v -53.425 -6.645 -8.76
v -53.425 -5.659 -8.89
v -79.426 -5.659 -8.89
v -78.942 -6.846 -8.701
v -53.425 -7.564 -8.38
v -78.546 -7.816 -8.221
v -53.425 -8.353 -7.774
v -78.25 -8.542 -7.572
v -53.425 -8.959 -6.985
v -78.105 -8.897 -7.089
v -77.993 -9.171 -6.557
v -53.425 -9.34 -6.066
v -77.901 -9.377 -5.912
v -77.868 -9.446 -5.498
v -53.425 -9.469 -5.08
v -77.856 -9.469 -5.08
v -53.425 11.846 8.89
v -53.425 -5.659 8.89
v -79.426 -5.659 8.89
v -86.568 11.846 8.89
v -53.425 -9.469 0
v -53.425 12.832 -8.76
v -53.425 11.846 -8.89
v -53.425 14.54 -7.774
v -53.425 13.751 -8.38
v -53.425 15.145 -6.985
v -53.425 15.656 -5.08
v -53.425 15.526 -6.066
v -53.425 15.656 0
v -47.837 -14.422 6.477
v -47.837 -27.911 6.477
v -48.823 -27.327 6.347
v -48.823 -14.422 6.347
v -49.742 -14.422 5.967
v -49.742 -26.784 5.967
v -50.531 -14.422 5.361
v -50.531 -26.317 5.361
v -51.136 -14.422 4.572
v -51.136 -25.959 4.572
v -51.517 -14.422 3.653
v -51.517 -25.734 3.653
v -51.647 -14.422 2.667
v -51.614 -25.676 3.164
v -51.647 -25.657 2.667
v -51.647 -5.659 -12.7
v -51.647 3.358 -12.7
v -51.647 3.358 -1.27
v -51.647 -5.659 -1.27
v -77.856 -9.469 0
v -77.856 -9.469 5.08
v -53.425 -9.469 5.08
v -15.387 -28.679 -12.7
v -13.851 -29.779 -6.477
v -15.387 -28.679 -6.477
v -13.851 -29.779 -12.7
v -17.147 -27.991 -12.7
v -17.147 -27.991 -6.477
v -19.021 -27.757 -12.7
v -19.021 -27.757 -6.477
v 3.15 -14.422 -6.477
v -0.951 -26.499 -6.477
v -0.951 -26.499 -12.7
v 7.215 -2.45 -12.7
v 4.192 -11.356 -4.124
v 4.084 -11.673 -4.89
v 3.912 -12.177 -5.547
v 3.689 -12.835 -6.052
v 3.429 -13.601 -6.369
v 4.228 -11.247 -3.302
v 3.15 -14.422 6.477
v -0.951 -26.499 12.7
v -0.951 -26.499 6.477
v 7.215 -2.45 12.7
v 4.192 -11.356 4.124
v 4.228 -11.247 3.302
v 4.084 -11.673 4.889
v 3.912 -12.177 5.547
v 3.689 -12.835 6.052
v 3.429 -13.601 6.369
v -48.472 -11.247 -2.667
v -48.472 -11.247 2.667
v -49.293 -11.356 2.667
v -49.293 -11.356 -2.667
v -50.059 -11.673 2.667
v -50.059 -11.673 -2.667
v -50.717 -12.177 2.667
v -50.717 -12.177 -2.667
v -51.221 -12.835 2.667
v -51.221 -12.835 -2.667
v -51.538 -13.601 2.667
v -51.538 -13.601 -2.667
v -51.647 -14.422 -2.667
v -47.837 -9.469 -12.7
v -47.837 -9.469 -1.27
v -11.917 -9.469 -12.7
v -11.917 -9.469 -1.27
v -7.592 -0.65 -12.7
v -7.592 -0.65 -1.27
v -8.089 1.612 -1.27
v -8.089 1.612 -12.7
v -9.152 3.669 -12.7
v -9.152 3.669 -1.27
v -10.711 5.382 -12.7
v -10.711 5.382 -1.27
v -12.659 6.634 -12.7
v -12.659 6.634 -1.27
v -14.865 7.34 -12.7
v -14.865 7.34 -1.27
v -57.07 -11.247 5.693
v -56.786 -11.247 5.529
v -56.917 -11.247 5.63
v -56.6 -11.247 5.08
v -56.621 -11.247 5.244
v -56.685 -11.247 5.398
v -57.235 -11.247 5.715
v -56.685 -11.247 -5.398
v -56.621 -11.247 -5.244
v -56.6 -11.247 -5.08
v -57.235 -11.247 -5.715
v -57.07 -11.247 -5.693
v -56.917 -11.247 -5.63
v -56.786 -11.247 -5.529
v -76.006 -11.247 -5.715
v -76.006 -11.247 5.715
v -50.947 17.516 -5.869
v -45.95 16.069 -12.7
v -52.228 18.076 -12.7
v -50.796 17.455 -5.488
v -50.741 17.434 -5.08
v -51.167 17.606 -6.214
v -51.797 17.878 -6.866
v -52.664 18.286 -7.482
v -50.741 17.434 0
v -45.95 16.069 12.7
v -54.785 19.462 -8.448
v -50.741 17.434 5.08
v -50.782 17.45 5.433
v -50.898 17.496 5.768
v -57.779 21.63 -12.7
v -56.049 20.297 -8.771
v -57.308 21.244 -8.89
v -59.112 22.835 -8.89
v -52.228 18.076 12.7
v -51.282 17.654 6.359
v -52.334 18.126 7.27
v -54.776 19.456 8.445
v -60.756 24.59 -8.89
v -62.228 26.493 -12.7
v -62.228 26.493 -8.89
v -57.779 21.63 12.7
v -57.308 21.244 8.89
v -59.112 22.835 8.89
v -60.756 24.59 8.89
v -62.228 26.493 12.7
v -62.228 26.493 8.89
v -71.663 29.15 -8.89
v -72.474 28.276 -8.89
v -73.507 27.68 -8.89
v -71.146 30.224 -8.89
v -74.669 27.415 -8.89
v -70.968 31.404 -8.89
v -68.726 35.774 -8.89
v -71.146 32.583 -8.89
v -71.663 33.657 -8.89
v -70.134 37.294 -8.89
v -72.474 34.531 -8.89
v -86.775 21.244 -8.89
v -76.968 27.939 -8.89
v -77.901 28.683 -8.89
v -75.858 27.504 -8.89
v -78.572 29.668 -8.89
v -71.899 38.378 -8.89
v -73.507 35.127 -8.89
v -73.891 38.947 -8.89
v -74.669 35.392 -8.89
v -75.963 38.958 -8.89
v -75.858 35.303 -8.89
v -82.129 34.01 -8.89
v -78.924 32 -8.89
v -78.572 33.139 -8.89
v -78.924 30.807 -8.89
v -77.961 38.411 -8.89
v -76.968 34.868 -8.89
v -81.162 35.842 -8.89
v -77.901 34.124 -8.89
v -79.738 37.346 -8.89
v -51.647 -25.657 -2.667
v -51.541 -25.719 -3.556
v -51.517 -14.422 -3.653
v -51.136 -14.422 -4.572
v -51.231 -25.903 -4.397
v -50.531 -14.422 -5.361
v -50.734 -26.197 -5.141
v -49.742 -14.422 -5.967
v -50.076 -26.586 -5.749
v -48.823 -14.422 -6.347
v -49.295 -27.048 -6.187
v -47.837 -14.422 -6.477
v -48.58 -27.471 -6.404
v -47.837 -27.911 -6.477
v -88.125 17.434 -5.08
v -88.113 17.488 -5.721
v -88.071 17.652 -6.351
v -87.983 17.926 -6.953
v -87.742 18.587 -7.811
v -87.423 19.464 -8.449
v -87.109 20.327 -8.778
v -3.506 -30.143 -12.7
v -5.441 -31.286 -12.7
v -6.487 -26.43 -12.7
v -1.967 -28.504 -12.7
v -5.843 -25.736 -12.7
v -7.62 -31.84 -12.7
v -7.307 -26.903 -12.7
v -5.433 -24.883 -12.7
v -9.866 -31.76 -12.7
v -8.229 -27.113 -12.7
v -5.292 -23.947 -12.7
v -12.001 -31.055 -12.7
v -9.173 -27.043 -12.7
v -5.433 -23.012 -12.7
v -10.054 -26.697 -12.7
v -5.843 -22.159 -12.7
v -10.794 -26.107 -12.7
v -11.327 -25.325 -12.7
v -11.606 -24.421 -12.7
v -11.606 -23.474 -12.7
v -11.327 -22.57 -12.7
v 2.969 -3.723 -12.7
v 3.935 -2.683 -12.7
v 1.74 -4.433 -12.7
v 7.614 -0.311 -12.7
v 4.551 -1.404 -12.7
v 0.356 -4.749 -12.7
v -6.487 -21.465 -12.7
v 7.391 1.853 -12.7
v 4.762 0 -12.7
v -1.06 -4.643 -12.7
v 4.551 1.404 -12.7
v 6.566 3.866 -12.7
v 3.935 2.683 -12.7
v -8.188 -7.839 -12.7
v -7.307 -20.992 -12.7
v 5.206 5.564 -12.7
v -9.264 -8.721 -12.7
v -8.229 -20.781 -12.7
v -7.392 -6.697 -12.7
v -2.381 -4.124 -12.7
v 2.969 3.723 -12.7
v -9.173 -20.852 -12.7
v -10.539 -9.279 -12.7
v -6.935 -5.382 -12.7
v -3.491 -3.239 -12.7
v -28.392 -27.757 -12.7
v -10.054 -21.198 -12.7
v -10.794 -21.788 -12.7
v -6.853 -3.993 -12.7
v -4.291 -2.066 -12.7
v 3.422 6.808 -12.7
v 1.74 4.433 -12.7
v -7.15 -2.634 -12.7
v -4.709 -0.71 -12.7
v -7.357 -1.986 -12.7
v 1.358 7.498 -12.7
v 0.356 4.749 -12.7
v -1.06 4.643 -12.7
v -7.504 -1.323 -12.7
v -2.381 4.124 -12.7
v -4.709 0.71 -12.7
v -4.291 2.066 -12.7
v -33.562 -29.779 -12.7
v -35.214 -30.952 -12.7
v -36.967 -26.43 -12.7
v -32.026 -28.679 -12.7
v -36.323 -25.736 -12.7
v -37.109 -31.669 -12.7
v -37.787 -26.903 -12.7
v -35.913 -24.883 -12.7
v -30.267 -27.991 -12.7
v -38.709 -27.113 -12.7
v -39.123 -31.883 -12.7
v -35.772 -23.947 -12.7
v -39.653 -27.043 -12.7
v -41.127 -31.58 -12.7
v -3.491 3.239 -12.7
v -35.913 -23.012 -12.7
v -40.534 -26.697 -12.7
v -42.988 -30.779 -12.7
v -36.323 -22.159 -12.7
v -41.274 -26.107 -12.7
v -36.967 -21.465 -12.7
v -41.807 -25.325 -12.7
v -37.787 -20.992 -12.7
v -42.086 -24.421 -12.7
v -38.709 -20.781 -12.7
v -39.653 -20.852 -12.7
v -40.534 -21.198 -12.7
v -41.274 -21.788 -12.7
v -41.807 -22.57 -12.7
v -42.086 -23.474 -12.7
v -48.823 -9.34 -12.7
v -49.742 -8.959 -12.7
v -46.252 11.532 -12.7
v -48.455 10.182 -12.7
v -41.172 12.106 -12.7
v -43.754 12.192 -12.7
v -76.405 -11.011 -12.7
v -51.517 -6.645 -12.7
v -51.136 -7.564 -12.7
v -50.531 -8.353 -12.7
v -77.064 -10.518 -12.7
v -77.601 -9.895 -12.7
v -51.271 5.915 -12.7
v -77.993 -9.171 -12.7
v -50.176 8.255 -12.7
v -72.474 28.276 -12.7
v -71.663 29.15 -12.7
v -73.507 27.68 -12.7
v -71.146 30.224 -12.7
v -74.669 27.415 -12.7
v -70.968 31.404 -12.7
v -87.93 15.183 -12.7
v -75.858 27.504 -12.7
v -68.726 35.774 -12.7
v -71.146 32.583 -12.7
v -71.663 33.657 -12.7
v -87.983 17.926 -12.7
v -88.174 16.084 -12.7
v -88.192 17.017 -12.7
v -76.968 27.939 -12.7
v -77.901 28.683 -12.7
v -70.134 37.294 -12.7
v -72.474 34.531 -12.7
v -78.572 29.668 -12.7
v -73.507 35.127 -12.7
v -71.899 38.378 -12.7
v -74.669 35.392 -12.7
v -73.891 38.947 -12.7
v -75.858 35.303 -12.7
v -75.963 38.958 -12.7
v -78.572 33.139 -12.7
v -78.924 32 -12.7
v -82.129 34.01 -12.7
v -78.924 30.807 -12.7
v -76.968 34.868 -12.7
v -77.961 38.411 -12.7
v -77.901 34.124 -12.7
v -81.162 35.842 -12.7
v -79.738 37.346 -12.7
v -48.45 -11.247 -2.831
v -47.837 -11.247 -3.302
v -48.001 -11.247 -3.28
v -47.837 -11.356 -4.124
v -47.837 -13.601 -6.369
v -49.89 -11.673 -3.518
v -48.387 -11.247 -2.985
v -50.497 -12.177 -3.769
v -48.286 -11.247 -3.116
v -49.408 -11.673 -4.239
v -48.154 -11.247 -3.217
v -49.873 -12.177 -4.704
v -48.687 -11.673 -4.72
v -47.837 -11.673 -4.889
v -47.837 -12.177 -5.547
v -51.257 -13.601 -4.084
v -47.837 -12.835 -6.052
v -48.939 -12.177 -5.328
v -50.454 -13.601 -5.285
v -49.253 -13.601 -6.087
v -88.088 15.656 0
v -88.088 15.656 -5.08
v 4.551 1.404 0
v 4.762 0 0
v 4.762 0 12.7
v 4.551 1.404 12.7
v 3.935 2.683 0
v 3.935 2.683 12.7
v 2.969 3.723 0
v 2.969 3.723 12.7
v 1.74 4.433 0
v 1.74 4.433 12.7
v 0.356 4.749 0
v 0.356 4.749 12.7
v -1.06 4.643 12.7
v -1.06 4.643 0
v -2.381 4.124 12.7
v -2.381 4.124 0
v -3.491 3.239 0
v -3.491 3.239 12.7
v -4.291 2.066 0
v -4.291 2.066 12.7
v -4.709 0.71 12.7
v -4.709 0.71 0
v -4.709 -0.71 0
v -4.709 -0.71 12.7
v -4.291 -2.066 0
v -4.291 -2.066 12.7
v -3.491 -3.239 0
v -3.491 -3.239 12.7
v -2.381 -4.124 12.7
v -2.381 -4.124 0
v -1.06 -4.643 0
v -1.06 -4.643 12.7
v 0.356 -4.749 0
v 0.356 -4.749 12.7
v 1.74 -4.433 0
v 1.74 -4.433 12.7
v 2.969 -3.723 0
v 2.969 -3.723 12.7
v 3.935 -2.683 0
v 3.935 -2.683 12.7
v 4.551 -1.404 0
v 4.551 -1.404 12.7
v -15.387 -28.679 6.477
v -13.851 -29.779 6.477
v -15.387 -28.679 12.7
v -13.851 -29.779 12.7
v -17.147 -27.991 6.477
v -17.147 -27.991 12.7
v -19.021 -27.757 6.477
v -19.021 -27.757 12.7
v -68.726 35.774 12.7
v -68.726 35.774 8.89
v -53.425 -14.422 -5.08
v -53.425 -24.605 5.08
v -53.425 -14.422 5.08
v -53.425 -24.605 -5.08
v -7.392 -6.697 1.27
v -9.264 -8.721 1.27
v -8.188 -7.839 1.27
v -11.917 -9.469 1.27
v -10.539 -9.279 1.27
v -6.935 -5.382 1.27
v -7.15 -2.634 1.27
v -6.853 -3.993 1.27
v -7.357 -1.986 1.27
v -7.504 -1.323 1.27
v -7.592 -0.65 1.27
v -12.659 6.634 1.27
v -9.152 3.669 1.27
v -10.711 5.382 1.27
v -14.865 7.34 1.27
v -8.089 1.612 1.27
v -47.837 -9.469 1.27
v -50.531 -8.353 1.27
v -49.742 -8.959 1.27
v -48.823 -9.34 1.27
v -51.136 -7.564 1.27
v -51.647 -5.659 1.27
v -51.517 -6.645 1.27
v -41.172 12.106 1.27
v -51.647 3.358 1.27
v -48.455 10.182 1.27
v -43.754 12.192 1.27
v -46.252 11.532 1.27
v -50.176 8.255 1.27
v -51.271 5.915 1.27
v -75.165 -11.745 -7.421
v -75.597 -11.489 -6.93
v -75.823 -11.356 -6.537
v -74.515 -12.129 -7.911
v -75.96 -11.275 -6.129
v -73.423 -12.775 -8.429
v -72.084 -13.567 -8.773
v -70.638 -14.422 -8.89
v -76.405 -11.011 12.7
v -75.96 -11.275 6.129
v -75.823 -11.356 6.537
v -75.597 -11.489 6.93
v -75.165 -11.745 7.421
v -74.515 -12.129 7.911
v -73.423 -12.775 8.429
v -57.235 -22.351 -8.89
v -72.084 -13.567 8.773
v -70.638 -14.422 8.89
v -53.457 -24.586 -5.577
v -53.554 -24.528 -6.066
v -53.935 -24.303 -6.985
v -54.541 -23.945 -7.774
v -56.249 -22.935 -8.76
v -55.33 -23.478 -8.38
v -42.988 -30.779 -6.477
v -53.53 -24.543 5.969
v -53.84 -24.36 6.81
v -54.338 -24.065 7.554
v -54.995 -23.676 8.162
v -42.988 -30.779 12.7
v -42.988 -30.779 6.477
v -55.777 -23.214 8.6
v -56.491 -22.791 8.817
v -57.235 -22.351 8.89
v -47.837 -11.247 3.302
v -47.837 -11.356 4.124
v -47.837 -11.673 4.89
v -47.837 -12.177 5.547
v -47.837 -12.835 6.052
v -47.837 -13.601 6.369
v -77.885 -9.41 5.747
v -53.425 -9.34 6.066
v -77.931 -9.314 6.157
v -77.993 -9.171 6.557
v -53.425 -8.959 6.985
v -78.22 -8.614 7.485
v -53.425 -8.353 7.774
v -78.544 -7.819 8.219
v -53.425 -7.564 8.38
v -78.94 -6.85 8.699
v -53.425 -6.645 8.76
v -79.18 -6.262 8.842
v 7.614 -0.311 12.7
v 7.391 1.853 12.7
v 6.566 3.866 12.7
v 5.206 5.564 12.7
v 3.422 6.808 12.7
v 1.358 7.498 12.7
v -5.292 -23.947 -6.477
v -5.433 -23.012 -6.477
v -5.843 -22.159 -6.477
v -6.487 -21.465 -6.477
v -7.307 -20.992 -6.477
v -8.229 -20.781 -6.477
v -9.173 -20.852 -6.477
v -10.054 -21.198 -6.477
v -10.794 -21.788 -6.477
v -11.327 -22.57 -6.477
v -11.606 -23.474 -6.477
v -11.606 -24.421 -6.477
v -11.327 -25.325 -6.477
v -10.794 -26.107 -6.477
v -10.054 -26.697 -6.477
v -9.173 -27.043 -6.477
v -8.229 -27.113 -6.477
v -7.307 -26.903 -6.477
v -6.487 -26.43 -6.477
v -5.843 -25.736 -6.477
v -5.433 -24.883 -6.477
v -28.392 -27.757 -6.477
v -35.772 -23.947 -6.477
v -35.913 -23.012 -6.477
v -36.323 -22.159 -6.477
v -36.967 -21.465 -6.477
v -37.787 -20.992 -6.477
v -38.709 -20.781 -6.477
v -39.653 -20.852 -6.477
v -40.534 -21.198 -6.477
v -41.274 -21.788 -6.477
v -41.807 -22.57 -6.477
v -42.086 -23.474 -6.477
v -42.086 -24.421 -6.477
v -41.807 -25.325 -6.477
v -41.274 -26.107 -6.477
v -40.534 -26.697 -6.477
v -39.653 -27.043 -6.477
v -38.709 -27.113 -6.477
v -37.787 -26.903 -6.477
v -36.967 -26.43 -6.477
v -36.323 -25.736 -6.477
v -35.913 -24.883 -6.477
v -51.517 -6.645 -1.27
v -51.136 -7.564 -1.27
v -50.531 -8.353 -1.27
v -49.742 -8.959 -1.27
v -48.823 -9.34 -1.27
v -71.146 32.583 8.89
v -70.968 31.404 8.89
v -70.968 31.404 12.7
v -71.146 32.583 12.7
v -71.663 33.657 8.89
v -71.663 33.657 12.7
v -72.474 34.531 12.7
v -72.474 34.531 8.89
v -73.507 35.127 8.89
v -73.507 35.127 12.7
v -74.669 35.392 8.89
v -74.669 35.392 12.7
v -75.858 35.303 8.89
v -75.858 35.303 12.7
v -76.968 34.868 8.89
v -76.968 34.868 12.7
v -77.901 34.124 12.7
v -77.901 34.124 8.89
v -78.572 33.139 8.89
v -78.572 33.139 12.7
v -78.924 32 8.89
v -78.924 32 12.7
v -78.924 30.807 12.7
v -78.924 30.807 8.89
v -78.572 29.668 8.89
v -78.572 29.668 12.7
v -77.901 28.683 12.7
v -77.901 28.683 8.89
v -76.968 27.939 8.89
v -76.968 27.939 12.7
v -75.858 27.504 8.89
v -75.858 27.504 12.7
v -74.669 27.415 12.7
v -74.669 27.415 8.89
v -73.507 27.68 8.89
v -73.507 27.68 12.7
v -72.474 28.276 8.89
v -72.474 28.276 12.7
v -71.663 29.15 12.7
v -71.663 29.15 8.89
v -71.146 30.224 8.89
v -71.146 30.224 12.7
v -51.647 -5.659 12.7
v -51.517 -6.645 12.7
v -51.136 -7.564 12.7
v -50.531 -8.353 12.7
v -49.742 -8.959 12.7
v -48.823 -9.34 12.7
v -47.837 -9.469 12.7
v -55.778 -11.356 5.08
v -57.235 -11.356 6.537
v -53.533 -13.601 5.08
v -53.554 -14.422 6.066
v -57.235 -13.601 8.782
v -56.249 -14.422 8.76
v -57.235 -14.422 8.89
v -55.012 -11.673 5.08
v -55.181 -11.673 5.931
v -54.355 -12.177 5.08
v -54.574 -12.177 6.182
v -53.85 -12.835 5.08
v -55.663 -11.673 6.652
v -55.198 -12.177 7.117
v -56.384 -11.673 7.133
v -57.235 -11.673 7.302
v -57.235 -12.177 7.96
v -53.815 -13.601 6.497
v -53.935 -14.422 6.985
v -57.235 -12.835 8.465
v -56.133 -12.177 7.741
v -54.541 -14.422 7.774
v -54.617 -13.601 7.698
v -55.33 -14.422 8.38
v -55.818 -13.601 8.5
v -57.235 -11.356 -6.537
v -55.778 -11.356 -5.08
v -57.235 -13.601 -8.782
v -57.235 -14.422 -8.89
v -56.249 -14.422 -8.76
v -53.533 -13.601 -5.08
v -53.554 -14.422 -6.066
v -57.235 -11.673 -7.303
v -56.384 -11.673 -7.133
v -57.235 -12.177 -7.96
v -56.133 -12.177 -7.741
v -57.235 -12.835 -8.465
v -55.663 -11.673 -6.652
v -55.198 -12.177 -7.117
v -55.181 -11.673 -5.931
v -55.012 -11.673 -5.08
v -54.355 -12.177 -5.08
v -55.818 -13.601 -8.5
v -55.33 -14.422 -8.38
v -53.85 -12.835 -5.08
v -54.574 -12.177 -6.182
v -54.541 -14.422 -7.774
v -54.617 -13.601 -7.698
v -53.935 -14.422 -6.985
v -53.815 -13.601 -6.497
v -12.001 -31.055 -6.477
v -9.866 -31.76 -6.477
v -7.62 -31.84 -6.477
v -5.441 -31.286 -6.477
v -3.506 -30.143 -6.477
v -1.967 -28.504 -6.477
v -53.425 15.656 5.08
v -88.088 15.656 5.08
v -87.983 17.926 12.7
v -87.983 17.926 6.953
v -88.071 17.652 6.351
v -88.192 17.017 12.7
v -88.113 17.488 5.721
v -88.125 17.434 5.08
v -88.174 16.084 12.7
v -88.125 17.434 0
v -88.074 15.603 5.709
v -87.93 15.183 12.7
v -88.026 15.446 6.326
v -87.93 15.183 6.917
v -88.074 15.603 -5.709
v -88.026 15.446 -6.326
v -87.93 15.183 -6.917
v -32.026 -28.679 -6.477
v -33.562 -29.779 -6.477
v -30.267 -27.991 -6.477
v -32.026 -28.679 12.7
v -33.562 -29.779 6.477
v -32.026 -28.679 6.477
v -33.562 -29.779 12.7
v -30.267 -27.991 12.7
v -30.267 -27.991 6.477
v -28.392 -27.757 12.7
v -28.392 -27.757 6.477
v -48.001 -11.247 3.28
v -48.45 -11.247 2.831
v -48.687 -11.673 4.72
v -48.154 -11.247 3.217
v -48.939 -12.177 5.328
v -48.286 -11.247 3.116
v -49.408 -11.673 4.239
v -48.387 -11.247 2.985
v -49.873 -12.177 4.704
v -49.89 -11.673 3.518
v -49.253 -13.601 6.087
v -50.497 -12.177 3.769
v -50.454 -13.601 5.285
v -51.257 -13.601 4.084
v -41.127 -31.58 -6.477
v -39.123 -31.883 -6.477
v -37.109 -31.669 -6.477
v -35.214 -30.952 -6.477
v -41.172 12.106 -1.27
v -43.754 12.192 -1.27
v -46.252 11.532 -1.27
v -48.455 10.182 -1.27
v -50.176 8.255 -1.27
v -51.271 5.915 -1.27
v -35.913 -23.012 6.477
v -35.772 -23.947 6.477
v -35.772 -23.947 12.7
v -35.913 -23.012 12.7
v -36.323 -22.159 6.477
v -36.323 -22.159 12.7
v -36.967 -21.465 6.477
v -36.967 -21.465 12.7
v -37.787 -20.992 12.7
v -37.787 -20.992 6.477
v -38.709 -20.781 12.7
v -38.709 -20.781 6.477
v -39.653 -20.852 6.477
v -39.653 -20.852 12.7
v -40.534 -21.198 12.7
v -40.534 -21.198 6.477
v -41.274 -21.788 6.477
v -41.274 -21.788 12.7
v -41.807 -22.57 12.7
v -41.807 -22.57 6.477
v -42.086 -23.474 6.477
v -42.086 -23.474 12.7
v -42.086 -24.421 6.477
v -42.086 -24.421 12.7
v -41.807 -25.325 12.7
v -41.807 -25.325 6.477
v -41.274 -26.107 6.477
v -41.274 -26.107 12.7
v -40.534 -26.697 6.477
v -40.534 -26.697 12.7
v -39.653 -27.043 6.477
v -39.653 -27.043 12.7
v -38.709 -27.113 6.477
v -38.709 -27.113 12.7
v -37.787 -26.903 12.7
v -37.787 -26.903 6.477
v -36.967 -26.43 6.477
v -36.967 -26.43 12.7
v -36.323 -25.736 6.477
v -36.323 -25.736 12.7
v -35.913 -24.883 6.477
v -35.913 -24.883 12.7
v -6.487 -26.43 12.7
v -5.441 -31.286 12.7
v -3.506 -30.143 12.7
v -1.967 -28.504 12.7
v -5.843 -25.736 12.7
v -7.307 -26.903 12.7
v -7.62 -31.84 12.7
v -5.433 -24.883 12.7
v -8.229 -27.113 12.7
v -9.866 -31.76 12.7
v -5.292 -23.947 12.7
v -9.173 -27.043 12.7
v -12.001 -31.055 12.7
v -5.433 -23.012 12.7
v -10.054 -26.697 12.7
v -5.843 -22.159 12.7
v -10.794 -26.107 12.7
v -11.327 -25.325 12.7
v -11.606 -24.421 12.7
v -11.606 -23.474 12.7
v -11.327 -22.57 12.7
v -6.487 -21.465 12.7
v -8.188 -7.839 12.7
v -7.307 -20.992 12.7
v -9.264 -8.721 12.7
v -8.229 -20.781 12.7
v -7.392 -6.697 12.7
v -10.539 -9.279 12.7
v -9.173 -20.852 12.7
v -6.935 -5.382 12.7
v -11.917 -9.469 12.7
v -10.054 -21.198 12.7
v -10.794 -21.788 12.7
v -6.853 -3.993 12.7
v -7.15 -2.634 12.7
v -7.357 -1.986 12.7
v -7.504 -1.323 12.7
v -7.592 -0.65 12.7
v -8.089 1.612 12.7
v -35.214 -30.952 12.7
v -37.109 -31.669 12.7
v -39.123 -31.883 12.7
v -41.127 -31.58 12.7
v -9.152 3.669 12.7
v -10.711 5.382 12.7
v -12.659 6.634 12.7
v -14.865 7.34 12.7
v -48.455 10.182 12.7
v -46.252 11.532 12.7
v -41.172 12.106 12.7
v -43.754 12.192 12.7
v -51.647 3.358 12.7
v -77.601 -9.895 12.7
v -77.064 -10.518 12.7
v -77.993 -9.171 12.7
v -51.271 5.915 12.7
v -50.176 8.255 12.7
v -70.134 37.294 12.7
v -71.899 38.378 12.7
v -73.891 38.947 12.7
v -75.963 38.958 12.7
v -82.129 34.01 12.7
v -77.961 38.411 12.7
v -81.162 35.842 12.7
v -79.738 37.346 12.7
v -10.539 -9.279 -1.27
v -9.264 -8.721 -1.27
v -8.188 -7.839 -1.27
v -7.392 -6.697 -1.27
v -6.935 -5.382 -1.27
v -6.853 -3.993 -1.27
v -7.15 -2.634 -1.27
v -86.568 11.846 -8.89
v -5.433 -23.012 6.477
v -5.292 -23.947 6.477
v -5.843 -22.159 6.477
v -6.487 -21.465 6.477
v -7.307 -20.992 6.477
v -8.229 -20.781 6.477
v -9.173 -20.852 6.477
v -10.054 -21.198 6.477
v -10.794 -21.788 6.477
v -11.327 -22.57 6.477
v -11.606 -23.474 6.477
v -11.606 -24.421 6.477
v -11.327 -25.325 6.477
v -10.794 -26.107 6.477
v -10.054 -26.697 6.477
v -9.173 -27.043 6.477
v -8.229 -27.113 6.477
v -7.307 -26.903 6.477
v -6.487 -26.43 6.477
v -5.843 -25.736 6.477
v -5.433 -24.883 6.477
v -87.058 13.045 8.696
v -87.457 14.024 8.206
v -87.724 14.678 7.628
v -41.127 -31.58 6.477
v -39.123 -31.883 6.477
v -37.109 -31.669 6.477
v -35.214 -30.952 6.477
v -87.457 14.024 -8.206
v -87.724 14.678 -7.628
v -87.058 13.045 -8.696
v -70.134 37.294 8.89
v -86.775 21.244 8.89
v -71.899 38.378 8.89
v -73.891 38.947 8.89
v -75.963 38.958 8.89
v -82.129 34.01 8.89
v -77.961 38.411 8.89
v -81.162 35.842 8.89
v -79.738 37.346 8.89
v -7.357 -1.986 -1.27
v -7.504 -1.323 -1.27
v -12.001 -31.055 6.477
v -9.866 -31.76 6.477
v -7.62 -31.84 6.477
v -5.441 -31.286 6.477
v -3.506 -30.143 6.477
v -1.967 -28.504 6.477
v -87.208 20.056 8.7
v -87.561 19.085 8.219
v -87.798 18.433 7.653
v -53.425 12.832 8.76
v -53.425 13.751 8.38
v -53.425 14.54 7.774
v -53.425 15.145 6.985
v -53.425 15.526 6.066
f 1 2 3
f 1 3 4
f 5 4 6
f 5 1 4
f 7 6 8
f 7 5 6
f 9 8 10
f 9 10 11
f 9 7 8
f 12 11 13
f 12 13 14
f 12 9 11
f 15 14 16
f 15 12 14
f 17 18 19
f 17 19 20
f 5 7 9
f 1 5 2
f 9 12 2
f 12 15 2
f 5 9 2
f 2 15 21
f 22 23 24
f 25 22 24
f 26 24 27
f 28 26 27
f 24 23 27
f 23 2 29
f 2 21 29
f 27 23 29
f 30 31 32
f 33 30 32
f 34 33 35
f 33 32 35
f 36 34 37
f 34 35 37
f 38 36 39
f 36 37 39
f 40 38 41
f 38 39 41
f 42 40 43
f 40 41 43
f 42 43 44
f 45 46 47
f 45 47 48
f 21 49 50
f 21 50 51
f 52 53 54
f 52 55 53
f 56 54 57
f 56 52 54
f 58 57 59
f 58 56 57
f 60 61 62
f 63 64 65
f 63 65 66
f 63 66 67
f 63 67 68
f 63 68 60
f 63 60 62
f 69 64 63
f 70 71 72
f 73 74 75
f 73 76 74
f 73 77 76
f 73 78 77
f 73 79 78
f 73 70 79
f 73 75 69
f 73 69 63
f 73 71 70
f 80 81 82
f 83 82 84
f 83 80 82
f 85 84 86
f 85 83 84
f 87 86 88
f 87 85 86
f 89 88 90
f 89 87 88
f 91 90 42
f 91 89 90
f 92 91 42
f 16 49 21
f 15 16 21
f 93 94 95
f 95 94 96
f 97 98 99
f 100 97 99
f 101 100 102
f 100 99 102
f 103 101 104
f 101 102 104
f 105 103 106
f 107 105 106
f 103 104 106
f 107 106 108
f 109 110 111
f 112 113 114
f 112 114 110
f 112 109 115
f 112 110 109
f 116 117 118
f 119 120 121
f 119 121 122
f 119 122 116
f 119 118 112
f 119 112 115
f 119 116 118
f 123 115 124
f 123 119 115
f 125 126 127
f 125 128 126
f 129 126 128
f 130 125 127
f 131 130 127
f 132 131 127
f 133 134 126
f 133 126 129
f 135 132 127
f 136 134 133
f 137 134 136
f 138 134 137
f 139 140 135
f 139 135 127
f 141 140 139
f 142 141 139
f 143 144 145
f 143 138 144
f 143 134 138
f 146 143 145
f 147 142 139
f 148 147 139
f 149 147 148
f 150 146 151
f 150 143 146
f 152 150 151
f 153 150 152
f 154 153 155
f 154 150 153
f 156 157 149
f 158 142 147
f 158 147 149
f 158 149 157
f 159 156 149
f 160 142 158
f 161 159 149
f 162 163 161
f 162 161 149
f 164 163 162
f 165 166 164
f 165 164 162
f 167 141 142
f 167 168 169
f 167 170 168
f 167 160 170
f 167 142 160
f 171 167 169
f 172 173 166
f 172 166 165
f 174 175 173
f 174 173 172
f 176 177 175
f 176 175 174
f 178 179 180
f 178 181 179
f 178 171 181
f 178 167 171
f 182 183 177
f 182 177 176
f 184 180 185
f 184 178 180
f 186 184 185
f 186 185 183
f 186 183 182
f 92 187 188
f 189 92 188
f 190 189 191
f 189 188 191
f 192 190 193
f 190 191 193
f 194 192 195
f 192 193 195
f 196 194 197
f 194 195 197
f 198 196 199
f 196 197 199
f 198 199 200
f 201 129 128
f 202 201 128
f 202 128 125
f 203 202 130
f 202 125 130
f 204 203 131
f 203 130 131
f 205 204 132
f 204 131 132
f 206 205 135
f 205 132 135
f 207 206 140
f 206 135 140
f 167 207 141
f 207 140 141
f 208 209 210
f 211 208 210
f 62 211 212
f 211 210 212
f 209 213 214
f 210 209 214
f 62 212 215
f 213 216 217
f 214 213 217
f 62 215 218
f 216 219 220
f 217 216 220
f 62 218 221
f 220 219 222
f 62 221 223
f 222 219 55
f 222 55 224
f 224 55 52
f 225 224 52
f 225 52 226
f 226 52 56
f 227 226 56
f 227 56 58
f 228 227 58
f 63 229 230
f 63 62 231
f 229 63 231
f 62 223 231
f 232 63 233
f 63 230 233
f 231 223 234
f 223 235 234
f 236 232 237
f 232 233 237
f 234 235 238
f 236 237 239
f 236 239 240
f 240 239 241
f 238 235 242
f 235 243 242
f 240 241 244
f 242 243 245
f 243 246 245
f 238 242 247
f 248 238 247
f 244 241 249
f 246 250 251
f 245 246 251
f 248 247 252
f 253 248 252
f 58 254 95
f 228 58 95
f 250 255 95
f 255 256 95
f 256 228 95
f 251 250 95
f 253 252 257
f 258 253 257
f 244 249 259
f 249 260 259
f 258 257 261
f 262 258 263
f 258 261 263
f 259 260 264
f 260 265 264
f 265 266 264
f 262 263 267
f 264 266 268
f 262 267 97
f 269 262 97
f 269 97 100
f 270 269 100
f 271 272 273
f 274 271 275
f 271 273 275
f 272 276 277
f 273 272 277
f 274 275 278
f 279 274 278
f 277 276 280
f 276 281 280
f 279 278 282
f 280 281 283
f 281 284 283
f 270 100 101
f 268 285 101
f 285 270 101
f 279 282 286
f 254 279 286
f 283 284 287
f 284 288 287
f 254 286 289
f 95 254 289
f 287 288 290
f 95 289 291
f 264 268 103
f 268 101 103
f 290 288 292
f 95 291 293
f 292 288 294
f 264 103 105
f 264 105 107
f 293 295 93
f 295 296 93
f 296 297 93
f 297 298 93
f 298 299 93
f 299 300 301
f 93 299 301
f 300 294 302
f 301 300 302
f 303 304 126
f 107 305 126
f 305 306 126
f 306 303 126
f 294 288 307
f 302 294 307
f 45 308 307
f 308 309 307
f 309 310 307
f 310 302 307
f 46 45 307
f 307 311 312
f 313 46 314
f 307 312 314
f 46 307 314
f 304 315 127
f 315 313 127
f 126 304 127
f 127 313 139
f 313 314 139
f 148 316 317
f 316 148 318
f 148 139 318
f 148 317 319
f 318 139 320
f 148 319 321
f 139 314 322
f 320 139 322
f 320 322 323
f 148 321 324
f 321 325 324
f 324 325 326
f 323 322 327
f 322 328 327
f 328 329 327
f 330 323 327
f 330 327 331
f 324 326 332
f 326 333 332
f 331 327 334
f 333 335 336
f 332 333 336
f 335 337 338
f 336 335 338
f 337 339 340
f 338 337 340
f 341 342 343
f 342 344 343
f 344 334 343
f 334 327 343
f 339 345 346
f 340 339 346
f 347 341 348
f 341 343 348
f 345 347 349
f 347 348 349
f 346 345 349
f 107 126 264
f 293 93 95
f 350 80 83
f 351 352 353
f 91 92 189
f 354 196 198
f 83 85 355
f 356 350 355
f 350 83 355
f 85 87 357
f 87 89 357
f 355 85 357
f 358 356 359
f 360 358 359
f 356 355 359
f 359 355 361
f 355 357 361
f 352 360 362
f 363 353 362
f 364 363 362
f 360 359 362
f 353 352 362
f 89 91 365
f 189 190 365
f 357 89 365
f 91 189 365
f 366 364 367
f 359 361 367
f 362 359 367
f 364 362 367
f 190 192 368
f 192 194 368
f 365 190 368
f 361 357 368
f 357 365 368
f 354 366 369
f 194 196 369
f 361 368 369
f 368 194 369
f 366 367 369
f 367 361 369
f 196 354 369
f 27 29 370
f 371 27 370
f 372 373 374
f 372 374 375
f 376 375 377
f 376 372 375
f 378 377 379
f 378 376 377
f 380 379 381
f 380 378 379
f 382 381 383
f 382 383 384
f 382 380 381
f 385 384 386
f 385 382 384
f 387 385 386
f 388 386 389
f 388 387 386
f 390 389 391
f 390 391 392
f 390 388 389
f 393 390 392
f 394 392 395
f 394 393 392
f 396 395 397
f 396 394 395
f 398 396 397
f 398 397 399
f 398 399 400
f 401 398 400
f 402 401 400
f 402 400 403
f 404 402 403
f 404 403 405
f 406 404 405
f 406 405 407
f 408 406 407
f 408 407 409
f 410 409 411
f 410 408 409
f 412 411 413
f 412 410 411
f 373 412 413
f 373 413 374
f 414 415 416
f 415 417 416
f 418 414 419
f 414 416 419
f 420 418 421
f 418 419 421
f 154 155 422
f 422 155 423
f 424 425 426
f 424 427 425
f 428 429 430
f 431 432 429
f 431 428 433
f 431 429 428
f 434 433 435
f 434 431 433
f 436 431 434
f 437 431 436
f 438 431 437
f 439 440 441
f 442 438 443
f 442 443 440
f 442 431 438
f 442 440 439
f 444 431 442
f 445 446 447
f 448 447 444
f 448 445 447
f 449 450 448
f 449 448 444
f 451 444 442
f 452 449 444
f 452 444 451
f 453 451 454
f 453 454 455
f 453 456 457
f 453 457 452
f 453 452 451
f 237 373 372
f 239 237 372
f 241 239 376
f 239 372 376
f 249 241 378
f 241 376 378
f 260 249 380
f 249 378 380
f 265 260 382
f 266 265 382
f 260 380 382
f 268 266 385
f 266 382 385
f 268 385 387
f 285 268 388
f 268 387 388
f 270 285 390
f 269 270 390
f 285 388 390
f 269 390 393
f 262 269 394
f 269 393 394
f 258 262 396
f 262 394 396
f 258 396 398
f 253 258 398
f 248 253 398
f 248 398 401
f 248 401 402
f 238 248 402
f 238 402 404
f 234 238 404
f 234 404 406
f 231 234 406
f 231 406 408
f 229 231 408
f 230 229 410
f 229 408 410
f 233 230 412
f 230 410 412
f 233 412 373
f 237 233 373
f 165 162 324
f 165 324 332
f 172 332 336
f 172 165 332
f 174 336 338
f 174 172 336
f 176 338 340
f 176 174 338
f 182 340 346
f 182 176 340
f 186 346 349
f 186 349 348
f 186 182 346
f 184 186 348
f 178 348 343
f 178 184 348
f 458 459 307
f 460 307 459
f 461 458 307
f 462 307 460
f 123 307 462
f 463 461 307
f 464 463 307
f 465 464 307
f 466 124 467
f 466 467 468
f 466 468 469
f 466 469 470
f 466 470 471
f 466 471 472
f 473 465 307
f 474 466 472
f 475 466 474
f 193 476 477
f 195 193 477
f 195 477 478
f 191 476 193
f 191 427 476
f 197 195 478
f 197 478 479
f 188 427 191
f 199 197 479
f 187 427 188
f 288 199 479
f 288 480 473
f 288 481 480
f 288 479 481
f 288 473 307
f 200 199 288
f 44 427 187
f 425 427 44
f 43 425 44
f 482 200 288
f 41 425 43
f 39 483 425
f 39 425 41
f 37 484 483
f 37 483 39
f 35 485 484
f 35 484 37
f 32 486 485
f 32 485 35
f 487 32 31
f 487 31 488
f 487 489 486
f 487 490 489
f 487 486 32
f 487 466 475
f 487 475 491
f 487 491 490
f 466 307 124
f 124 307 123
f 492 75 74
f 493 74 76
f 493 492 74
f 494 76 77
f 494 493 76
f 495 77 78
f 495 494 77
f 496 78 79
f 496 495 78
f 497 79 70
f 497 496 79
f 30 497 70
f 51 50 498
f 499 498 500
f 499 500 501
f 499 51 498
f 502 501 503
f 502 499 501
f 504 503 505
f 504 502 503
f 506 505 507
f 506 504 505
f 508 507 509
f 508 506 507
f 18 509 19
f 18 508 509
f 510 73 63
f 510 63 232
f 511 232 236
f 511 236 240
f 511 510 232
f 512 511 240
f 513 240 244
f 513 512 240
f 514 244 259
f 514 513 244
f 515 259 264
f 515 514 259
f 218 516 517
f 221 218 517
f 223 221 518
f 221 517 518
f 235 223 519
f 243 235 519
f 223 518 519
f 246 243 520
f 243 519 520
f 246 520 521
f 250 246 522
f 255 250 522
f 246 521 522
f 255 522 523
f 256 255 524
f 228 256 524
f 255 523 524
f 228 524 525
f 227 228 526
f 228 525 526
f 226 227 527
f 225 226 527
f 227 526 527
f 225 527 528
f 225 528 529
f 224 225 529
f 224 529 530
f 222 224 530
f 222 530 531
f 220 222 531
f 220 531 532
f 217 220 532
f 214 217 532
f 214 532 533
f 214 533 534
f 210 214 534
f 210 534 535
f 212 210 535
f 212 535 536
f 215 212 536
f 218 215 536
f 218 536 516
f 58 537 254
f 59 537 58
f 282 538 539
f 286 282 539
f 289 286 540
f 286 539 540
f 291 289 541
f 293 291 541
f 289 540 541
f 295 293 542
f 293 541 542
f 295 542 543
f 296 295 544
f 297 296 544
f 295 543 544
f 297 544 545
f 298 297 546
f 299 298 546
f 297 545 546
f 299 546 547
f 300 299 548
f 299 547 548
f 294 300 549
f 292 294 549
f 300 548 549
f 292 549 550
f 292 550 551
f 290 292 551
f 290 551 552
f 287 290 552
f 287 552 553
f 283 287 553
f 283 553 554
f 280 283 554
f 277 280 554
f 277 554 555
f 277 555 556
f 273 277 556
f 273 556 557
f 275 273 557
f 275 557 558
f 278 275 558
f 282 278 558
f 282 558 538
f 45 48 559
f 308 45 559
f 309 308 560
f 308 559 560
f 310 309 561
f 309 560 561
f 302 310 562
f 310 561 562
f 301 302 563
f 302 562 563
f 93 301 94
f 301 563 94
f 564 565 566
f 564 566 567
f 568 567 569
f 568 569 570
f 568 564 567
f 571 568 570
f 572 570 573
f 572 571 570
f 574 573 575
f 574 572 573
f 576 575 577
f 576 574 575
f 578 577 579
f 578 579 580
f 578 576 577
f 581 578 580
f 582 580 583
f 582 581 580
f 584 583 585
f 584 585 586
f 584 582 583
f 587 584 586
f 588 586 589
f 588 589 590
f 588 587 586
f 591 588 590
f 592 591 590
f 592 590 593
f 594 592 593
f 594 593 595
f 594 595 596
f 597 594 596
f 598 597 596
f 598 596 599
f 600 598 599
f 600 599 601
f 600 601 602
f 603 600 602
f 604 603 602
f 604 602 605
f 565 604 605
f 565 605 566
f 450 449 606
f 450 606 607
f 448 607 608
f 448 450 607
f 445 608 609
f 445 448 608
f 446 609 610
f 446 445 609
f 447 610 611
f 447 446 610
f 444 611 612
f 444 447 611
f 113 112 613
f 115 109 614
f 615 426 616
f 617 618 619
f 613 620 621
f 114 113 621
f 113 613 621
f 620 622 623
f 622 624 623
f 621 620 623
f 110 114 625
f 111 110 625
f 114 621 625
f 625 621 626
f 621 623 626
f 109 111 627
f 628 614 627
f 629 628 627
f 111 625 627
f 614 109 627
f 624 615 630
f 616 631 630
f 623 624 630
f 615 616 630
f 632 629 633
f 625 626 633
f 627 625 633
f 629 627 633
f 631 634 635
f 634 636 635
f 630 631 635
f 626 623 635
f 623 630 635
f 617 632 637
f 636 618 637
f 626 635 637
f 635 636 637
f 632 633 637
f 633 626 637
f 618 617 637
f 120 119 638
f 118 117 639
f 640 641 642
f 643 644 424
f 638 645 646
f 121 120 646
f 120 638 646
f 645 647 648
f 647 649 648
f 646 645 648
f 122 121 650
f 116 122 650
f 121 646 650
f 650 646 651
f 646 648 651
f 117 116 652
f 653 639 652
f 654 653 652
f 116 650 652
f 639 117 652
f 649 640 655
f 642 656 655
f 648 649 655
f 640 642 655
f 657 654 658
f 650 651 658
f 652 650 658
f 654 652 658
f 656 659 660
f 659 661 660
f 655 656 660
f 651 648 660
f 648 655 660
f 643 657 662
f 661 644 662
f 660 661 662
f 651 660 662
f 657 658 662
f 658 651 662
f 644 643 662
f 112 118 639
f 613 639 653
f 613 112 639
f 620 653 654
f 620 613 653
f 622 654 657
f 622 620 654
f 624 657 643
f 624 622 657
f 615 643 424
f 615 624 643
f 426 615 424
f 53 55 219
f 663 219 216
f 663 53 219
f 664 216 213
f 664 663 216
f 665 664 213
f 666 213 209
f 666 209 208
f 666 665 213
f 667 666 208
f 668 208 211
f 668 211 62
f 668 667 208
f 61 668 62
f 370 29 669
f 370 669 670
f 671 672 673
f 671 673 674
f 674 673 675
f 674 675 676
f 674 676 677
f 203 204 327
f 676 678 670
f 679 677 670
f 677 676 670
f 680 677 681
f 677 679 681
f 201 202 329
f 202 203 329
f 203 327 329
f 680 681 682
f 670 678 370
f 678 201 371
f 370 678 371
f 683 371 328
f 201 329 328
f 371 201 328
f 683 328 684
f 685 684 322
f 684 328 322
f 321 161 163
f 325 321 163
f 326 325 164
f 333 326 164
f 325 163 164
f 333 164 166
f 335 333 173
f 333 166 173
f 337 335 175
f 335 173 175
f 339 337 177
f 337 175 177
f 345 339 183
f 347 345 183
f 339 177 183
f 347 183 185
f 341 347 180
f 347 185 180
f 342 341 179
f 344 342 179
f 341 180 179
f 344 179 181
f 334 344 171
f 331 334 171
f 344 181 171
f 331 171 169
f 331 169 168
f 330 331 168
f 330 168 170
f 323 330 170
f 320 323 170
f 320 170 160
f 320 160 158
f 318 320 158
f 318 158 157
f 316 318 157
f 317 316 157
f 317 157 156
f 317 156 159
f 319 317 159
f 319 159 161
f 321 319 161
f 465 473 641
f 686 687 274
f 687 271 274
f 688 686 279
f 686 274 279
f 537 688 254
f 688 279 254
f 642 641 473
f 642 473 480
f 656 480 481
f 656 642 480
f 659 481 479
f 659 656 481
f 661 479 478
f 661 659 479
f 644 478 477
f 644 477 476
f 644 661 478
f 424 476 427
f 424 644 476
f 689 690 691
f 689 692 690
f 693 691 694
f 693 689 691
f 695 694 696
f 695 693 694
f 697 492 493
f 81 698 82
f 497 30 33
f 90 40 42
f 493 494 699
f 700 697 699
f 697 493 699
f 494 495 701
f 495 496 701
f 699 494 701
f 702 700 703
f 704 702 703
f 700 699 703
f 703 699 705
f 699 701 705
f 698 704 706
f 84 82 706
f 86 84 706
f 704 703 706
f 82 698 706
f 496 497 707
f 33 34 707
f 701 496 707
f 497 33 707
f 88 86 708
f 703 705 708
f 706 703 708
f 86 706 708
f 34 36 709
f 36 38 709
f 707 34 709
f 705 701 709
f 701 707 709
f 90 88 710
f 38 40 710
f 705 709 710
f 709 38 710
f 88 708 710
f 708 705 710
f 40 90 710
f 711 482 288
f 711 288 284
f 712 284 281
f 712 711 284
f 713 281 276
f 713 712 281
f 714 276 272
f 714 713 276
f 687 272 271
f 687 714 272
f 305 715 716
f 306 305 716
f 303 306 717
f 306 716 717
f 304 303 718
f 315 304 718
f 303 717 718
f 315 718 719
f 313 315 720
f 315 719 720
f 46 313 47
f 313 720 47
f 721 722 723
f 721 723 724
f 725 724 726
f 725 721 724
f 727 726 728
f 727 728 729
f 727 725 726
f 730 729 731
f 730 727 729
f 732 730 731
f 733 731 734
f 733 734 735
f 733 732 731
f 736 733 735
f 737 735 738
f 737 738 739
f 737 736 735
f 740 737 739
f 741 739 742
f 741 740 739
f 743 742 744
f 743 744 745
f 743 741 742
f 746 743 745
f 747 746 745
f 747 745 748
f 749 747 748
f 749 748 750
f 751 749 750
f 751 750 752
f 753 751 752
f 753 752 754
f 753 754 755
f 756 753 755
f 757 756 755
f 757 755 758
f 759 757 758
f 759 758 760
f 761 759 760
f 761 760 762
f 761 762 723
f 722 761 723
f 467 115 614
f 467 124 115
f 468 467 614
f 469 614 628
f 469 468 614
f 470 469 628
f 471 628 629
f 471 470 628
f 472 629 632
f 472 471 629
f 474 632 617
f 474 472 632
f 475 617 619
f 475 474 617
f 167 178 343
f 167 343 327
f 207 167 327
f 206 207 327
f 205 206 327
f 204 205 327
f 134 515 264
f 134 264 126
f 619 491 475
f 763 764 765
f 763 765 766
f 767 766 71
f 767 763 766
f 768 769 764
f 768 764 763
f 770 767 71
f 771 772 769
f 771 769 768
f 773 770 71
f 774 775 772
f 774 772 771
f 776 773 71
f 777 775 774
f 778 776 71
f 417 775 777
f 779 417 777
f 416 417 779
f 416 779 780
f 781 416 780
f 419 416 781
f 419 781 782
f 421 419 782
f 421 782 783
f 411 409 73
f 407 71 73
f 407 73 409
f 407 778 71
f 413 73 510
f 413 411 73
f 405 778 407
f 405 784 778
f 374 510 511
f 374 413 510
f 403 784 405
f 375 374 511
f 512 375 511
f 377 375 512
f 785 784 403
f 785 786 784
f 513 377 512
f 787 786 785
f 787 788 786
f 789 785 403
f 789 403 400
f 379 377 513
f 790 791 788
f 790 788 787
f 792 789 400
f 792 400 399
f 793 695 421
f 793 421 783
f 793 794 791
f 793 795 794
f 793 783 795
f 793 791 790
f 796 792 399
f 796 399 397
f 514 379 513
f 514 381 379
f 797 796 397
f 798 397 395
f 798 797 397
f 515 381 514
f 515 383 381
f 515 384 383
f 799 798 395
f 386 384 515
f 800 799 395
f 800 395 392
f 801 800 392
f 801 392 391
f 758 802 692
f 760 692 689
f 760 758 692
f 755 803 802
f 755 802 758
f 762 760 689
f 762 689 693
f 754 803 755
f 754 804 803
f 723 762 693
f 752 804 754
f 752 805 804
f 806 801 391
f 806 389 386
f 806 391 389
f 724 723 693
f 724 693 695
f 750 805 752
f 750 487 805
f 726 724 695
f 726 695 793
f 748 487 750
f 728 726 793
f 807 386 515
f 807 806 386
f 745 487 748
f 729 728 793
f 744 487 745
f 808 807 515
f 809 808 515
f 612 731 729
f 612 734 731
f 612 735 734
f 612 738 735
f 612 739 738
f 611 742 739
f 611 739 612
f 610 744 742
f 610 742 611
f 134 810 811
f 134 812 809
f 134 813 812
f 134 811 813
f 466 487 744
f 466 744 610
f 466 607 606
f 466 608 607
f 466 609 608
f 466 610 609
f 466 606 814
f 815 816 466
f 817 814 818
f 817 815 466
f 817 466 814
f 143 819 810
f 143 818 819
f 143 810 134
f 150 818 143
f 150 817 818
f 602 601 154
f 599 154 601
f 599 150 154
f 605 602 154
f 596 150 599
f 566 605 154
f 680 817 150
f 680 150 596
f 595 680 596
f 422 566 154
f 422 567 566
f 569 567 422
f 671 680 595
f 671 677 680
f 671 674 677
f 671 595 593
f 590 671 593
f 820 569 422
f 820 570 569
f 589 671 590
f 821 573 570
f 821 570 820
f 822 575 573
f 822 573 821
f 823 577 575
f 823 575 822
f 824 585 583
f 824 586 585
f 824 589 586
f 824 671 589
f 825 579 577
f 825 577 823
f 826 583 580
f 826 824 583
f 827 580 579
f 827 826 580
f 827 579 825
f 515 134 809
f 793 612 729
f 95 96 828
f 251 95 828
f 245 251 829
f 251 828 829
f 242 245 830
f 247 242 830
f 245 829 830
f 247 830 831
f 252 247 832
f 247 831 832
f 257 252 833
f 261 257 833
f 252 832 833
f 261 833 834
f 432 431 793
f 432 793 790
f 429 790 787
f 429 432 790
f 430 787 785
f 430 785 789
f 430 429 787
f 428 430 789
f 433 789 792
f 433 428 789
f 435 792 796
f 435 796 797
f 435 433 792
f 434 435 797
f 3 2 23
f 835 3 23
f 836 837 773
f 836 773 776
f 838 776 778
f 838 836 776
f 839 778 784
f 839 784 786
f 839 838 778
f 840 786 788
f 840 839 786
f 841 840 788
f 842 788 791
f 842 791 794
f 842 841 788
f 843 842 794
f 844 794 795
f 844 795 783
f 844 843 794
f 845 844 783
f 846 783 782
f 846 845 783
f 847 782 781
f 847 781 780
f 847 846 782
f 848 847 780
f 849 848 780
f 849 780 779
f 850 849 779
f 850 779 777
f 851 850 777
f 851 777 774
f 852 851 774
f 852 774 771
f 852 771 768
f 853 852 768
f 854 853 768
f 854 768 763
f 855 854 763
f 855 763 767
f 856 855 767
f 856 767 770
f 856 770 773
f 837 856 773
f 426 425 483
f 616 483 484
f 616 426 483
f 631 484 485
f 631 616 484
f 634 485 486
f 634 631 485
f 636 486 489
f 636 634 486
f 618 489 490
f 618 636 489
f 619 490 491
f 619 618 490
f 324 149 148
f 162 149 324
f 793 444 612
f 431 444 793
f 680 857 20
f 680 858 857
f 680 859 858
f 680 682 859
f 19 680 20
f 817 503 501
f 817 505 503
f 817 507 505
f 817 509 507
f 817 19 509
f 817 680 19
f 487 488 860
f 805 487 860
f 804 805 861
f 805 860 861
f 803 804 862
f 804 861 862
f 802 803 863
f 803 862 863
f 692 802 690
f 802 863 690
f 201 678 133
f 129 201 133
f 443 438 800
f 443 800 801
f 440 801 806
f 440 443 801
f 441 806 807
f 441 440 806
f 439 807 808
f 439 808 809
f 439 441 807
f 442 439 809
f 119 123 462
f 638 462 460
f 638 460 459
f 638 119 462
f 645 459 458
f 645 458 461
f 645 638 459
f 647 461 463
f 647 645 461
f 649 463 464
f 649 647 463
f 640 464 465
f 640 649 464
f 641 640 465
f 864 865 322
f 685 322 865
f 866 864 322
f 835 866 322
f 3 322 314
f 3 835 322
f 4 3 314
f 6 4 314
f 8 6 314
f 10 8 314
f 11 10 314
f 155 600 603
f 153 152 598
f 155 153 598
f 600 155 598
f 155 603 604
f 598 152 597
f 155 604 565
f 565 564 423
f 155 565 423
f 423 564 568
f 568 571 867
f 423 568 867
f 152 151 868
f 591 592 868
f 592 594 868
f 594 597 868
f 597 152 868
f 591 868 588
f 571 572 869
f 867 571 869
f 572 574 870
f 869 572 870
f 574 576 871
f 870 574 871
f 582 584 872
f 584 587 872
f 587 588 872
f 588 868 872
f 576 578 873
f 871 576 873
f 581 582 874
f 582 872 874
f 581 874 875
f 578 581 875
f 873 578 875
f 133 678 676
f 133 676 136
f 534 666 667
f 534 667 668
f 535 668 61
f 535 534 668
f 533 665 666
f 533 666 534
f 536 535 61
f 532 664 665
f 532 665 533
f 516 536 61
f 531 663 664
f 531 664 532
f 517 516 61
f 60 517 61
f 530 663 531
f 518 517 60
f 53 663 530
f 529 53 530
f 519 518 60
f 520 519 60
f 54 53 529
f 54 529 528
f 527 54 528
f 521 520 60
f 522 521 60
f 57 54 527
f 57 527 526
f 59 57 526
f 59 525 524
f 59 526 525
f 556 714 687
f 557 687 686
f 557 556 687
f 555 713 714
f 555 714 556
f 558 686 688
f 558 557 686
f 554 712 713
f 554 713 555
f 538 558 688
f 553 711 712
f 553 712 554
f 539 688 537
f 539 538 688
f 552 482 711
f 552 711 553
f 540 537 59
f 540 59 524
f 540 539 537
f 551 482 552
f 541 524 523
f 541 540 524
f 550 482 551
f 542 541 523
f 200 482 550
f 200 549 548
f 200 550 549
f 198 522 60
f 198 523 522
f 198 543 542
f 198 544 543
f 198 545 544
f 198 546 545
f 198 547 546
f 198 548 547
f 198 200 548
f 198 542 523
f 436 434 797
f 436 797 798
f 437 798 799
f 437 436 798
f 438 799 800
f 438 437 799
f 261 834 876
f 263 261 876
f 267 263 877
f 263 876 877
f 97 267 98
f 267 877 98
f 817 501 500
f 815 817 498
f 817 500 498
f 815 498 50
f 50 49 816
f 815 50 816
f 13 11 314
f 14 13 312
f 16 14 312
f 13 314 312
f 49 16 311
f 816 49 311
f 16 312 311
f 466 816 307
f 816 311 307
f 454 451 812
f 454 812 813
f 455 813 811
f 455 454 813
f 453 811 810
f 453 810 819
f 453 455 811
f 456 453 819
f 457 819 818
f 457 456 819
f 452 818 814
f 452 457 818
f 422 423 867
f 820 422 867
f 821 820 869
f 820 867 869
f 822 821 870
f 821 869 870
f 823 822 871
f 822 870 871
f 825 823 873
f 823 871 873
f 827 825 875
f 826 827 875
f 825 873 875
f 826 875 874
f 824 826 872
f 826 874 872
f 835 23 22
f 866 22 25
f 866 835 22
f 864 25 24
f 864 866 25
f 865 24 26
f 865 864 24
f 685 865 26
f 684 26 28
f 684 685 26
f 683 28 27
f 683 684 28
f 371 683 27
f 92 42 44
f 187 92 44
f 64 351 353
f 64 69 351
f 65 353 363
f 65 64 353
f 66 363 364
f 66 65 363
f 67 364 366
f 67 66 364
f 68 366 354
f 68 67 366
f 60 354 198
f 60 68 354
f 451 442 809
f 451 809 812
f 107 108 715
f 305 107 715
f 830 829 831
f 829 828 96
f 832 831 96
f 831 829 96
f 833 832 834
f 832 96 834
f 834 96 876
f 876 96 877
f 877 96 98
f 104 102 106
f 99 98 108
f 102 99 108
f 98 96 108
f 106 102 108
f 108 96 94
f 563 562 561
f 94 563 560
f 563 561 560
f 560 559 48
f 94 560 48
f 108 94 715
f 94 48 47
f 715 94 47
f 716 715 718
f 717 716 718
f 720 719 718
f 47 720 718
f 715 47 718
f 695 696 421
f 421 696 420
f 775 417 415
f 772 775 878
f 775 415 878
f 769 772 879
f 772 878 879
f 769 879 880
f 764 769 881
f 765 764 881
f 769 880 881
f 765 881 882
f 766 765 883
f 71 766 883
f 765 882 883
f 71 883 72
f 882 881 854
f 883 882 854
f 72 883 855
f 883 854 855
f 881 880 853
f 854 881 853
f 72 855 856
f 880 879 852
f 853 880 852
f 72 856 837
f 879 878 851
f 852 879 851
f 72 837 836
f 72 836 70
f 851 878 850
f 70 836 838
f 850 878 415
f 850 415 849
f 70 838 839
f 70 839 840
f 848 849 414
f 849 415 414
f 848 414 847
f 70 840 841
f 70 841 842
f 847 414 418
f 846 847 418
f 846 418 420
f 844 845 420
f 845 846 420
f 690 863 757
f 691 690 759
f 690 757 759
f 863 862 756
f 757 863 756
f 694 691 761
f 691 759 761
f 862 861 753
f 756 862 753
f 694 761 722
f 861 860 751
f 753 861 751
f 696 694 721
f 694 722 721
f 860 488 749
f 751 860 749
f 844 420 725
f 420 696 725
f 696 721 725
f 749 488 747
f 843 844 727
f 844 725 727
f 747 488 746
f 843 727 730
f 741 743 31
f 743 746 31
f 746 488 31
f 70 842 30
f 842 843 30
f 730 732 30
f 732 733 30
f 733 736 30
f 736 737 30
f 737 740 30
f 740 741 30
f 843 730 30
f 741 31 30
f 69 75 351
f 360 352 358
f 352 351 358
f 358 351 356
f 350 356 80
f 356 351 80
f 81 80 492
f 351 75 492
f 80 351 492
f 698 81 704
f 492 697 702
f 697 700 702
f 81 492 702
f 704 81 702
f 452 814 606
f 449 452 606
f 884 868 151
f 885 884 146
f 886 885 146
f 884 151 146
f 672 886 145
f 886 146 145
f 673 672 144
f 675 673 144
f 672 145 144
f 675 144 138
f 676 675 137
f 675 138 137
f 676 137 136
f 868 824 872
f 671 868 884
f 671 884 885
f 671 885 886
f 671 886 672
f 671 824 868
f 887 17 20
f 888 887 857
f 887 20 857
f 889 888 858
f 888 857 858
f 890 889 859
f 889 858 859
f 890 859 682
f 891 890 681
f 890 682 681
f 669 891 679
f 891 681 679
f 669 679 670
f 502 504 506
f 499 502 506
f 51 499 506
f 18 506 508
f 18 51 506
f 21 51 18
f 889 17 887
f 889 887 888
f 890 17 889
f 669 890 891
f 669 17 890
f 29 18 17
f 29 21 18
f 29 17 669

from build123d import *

# Parameters (mm, degrees)
SKETCH1_R           = 4.7625
SKETCH1_R_2         = 4
SKETCH1_R_3         = 3.175
BOSS_EXTRUDE1_DEPTH = 12.7
BOSS_EXTRUDE2_DEPTH = 1.27
SKETCH1_6_R         = 3.175
CUT_EXTRUDE1_DEPTH  = 6.477
SKETCH1_10_R        = 4
CUT_EXTRUDE3_DEPTH  = 8.89
FILLET1_R           = 3.81
FILLET3_R           = 3.81
FILLET4_R           = 3.175
FILLET5_R           = 7.62


with BuildPart() as part:
    # Sketch1 → Boss-Extrude1 (new body)
    with BuildSketch(Plane(origin=(0, 0, 0), x_dir=(0, 1, 0), z_dir=(0, 0, 1))):
        with BuildLine():
            Line((-26.499431941, 0.950631657), (-2.449998994, -7.215393609))
            ThreePointArc((-2.449998994, -7.215393609), (3.866048142, -6.56643524), (7.497932311, -1.358459074))
            Line((7.497932311, -1.358459074), (16.069122988, 45.94970705))
            ThreePointArc((16.069122988, 45.94970705), (19.672222889, 55.119231342), (26.493389209, 62.227972063))
            Line((26.493389209, 62.227972063), (35.774163974, 68.726440514))
            ThreePointArc((35.774163974, 68.726440514), (38.958321373, 75.962988676), (34.009705021, 82.128836862))
            Line((34.009705021, 82.128836862), (16.544511529, 88.485647429))
            Line((16.544511529, 88.485647429), (-10.358349656, 77.508379092))
            Line((-10.358349656, 77.508379092), (-30.779024566, 42.987968953))
            ThreePointArc((-30.779024566, 42.987968953), (-31.601546647, 36.844959103), (-27.757349656, 31.983348043))
            Line((-27.757349656, 31.983348043), (-27.757349656, 15.42998529))
            ThreePointArc((-27.757349656, 15.42998529), (-31.855063811, 7.779670964), (-26.499431941, 0.950631657))
        make_face()
        with Locations(Location((0, 0, 0), (0, 0, 270))):
            Circle(SKETCH1_R, mode=Mode.SUBTRACT)
        with Locations(Location((31.403511529, 74.968379092, 0), (0, 0, 270))):
            Circle(SKETCH1_R_2, mode=Mode.SUBTRACT)
        with Locations(Location((-23.947349656, 38.946666667, 0), (0, 0, 270))):
            Circle(SKETCH1_R_3, mode=Mode.SUBTRACT)
        with Locations(Location((-23.947349656, 8.466666667, 0), (0, 0, 270))):
            Circle(SKETCH1_R_3, mode=Mode.SUBTRACT)
        with BuildLine():
            Line((-9.469349656, 47.836666667), (-9.469349656, 11.917365883))
            ThreePointArc((-9.469349656, 11.917365883), (-7.295140555, 7.750499045), (-2.633609794, 7.15041953))
            ThreePointArc((-2.633609794, 7.15041953), (-1.656512431, 7.437766235), (-0.649822418, 7.592241489))
            ThreePointArc((-0.649822418, 7.592241489), (4.576435948, 9.875722251), (7.339639123, 14.86498764))
            Line((7.339639123, 14.86498764), (12.10584978, 41.171797748))
            ThreePointArc((12.10584978, 41.171797748), (10.181808987, 48.455026751), (3.358262084, 51.646666667))
            Line((3.358262084, 51.646666667), (-5.659349656, 51.646666667))
            ThreePointArc((-5.659349656, 51.646666667), (-8.353426493, 50.530743503), (-9.469349656, 47.836666667))
        make_face(mode=Mode.SUBTRACT)
    extrude(amount=BOSS_EXTRUDE1_DEPTH)

    # Sketch1<4> → Boss-Extrude2 (add)
    with BuildSketch(Plane(origin=(0, 0, 0), x_dir=(0, 1, 0), z_dir=(0, 0, 1))):
        with BuildLine():
            ThreePointArc((-5.659349656, 51.646666667), (-8.353426493, 50.530743503), (-9.469349656, 47.836666667))
            Line((-9.469349656, 47.836666667), (-9.469349656, 11.917365883))
            ThreePointArc((-9.469349656, 11.917365883), (-7.295140555, 7.750499045), (-2.633609794, 7.15041953))
            ThreePointArc((-2.633609794, 7.15041953), (-1.656512431, 7.437766235), (-0.649822418, 7.592241489))
            ThreePointArc((-0.649822418, 7.592241489), (4.576435948, 9.875722251), (7.339639123, 14.86498764))
            Line((7.339639123, 14.86498764), (12.10584978, 41.171797748))
            ThreePointArc((12.10584978, 41.171797748), (10.181808987, 48.455026751), (3.358262084, 51.646666667))
            Line((3.358262084, 51.646666667), (-5.659349656, 51.646666667))
        make_face()
    extrude(amount=BOSS_EXTRUDE2_DEPTH)

    # Sketch1<6> → Cut-Extrude1 (cut)
    with BuildSketch(Plane(origin=(0, 0, 0), x_dir=(0, 1, 0), z_dir=(0, 0, 1))):
        with BuildLine():
            ThreePointArc((-27.757349656, 15.42998529), (-31.855063811, 7.779670964), (-26.499431941, 0.950631657))
            Line((-26.499431941, 0.950631657), (-11.247349656, -4.228238446))
            Line((-11.247349656, -4.228238446), (-11.247349656, 51.646666667))
            Line((-11.247349656, 51.646666667), (-25.656940256, 51.646666667))
            Line((-25.656940256, 51.646666667), (-30.779024566, 42.987968953))
            ThreePointArc((-30.779024566, 42.987968953), (-31.601546647, 36.844959103), (-27.757349656, 31.983348043))
            Line((-27.757349656, 31.983348043), (-27.757349656, 15.42998529))
        make_face()
        with Locations(Location((-23.947349656, 8.466666667, 0), (0, 0, 270))):
            Circle(SKETCH1_6_R, mode=Mode.SUBTRACT)
        with Locations(Location((-23.947349656, 38.946666667, 0), (0, 0, 270))):
            Circle(SKETCH1_6_R, mode=Mode.SUBTRACT)
    extrude(amount=CUT_EXTRUDE1_DEPTH, mode=Mode.SUBTRACT)

    # Sketch1<10> → Cut-Extrude3 (cut)
    # profile 1 of 3: a face of its own
    with BuildSketch(Plane(origin=(0, 0, 0), x_dir=(0, 1, 0), z_dir=(0, 0, 1))):
        with BuildLine():
            Line((17.433511529, 88.162077891), (17.433511529, 50.740503147))
            ThreePointArc((17.433511529, 50.740503147), (21.118462359, 57.150658387), (26.493389209, 62.227972063))
            Line((26.493389209, 62.227972063), (35.774163974, 68.726440514))
            ThreePointArc((35.774163974, 68.726440514), (38.958321373, 75.962988676), (34.009705021, 82.128836862))
            Line((34.009705021, 82.128836862), (17.433511529, 88.162077891))
        make_face()
        with Locations(Location((31.403511529, 74.968379092, 0), (0, 0, 270))):
            Circle(SKETCH1_10_R, mode=Mode.SUBTRACT)
    # profile 2 of 3: a face of its own
    with BuildSketch(Plane(origin=(0, 0, 0), x_dir=(0, 1, 0), z_dir=(0, 0, 1))):
        Polygon((-11.247349656, 76.005556842), (-24.605157851, 53.424666667), (-11.247349656, 53.424666667), align=None)
    # profile 3 of 3: a face of its own
    with BuildSketch(Plane(origin=(0, 0, 0), x_dir=(0, 1, 0), z_dir=(0, 0, 1))):
        Polygon((15.655511529, 88.122905656), (-9.469349656, 77.871120864), (-9.469349656, 53.424666667), (15.655511529, 53.424666667), align=None)
    extrude(amount=CUT_EXTRUDE3_DEPTH, mode=Mode.SUBTRACT)

    # Mirror1: part across face


with BuildPart() as part_1:
    add(part.part)
    add(part.part.mirror(Plane(origin=(-30.744300958, 0.707665305, 0), x_dir=(1, 0, 0), z_dir=(0, 0, -1))))

    # Fillet1
    fillet1_edges = [part_1.edges().sort_by_distance(p)[0] for p in [
        (-69.451290519, 17.433511529, 8.89),
        (-51.646666667, -18.452144956, 6.477),
        (-51.646666667, -18.452144956, -6.477),
        (-53.424666667, -17.926253754, 8.89),
        (-53.424666667, -17.926253754, -8.89),
        (-70.773786162, 15.655511529, 8.89),
        (-65.647893765, -9.469349656, 8.89),
        (-65.647893765, -9.469349656, -8.89),
        (-70.773786162, 15.655511529, -8.89),
        (-69.451290519, 17.433511529, -8.89),
    ]]
    fillet(fillet1_edges, radius=FILLET1_R)

    # Fillet3
    # the kernel refuses this fillet: 3.81 mm, written as the material it takes off along each edge
    with BuildSketch(Plane(origin=(-77.508379092, -10.358349656, -15.90517458), x_dir=(-0.3777939966211631, 0.9258896781566412, 0), z_dir=(0, 0, 1))) as fillet3_piece_1:
        with BuildLine():
            CenterArc((FILLET3_R * 0.336501268256, -FILLET3_R), FILLET3_R, 90, 37.196303294)
            Line((-FILLET3_R * 0.268046453486, -FILLET3_R * 0.203431075087), (0, 0))
            Line((0, 0), (FILLET3_R * 0.336501268256, 0))
        make_face()
    extrude(amount=31.81034916, mode=Mode.SUBTRACT)
    with BuildSketch(Plane(origin=(-88.485647429, 16.544511529, -16.375115103), x_dir=(0.3420201433256622, 0.9396926207859108, 0), z_dir=(0, 0, 1))) as fillet3_piece_2:
        with BuildLine():
            CenterArc((FILLET3_R * 0.385838855973, -FILLET3_R), FILLET3_R, 90, 42.197104506)
            Line((-FILLET3_R * 0.285844295256, -FILLET3_R * 0.259161458646), (0, 0))
            Line((0, 0), (FILLET3_R * 0.385838855973, 0))
        make_face()
    extrude(amount=32.750230206, mode=Mode.SUBTRACT)

    # Fillet4
    fillet4_edges = [part_1.edges().sort_by_distance(p)[0] for p in [
        (-53.424666667, -11.247349656, 0),
        (-66.620111754, -11.247349656, -8.89),
        (-66.620111754, -11.247349656, 8.89),
        (-54.54058983, -11.247349656, -7.774076836),
        (-54.54058983, -11.247349656, 7.774076836),
        (-21.80421411, -11.247349656, 6.477),
        (-51.646666667, -11.247349656, 0),
        (-21.80421411, -11.247349656, -6.477),
        (-50.530743503, -11.247349656, -5.361076836),
        (-50.530743503, -11.247349656, 5.361076836),
    ]]
    fillet(fillet4_edges, radius=FILLET4_R)

    # Fillet5
    fillet5_edges = [part_1.edges().sort_by_distance(p)[0] for p in [
        (-31.983348043, -27.757349656, -9.5885),
        (-15.42998529, -27.757349656, -9.5885),
        (-15.42998529, -27.757349656, 9.5885),
        (-31.983348043, -27.757349656, 9.5885),
    ]]
    fillet(fillet5_edges, radius=FILLET5_R)


solid = part_1.part
